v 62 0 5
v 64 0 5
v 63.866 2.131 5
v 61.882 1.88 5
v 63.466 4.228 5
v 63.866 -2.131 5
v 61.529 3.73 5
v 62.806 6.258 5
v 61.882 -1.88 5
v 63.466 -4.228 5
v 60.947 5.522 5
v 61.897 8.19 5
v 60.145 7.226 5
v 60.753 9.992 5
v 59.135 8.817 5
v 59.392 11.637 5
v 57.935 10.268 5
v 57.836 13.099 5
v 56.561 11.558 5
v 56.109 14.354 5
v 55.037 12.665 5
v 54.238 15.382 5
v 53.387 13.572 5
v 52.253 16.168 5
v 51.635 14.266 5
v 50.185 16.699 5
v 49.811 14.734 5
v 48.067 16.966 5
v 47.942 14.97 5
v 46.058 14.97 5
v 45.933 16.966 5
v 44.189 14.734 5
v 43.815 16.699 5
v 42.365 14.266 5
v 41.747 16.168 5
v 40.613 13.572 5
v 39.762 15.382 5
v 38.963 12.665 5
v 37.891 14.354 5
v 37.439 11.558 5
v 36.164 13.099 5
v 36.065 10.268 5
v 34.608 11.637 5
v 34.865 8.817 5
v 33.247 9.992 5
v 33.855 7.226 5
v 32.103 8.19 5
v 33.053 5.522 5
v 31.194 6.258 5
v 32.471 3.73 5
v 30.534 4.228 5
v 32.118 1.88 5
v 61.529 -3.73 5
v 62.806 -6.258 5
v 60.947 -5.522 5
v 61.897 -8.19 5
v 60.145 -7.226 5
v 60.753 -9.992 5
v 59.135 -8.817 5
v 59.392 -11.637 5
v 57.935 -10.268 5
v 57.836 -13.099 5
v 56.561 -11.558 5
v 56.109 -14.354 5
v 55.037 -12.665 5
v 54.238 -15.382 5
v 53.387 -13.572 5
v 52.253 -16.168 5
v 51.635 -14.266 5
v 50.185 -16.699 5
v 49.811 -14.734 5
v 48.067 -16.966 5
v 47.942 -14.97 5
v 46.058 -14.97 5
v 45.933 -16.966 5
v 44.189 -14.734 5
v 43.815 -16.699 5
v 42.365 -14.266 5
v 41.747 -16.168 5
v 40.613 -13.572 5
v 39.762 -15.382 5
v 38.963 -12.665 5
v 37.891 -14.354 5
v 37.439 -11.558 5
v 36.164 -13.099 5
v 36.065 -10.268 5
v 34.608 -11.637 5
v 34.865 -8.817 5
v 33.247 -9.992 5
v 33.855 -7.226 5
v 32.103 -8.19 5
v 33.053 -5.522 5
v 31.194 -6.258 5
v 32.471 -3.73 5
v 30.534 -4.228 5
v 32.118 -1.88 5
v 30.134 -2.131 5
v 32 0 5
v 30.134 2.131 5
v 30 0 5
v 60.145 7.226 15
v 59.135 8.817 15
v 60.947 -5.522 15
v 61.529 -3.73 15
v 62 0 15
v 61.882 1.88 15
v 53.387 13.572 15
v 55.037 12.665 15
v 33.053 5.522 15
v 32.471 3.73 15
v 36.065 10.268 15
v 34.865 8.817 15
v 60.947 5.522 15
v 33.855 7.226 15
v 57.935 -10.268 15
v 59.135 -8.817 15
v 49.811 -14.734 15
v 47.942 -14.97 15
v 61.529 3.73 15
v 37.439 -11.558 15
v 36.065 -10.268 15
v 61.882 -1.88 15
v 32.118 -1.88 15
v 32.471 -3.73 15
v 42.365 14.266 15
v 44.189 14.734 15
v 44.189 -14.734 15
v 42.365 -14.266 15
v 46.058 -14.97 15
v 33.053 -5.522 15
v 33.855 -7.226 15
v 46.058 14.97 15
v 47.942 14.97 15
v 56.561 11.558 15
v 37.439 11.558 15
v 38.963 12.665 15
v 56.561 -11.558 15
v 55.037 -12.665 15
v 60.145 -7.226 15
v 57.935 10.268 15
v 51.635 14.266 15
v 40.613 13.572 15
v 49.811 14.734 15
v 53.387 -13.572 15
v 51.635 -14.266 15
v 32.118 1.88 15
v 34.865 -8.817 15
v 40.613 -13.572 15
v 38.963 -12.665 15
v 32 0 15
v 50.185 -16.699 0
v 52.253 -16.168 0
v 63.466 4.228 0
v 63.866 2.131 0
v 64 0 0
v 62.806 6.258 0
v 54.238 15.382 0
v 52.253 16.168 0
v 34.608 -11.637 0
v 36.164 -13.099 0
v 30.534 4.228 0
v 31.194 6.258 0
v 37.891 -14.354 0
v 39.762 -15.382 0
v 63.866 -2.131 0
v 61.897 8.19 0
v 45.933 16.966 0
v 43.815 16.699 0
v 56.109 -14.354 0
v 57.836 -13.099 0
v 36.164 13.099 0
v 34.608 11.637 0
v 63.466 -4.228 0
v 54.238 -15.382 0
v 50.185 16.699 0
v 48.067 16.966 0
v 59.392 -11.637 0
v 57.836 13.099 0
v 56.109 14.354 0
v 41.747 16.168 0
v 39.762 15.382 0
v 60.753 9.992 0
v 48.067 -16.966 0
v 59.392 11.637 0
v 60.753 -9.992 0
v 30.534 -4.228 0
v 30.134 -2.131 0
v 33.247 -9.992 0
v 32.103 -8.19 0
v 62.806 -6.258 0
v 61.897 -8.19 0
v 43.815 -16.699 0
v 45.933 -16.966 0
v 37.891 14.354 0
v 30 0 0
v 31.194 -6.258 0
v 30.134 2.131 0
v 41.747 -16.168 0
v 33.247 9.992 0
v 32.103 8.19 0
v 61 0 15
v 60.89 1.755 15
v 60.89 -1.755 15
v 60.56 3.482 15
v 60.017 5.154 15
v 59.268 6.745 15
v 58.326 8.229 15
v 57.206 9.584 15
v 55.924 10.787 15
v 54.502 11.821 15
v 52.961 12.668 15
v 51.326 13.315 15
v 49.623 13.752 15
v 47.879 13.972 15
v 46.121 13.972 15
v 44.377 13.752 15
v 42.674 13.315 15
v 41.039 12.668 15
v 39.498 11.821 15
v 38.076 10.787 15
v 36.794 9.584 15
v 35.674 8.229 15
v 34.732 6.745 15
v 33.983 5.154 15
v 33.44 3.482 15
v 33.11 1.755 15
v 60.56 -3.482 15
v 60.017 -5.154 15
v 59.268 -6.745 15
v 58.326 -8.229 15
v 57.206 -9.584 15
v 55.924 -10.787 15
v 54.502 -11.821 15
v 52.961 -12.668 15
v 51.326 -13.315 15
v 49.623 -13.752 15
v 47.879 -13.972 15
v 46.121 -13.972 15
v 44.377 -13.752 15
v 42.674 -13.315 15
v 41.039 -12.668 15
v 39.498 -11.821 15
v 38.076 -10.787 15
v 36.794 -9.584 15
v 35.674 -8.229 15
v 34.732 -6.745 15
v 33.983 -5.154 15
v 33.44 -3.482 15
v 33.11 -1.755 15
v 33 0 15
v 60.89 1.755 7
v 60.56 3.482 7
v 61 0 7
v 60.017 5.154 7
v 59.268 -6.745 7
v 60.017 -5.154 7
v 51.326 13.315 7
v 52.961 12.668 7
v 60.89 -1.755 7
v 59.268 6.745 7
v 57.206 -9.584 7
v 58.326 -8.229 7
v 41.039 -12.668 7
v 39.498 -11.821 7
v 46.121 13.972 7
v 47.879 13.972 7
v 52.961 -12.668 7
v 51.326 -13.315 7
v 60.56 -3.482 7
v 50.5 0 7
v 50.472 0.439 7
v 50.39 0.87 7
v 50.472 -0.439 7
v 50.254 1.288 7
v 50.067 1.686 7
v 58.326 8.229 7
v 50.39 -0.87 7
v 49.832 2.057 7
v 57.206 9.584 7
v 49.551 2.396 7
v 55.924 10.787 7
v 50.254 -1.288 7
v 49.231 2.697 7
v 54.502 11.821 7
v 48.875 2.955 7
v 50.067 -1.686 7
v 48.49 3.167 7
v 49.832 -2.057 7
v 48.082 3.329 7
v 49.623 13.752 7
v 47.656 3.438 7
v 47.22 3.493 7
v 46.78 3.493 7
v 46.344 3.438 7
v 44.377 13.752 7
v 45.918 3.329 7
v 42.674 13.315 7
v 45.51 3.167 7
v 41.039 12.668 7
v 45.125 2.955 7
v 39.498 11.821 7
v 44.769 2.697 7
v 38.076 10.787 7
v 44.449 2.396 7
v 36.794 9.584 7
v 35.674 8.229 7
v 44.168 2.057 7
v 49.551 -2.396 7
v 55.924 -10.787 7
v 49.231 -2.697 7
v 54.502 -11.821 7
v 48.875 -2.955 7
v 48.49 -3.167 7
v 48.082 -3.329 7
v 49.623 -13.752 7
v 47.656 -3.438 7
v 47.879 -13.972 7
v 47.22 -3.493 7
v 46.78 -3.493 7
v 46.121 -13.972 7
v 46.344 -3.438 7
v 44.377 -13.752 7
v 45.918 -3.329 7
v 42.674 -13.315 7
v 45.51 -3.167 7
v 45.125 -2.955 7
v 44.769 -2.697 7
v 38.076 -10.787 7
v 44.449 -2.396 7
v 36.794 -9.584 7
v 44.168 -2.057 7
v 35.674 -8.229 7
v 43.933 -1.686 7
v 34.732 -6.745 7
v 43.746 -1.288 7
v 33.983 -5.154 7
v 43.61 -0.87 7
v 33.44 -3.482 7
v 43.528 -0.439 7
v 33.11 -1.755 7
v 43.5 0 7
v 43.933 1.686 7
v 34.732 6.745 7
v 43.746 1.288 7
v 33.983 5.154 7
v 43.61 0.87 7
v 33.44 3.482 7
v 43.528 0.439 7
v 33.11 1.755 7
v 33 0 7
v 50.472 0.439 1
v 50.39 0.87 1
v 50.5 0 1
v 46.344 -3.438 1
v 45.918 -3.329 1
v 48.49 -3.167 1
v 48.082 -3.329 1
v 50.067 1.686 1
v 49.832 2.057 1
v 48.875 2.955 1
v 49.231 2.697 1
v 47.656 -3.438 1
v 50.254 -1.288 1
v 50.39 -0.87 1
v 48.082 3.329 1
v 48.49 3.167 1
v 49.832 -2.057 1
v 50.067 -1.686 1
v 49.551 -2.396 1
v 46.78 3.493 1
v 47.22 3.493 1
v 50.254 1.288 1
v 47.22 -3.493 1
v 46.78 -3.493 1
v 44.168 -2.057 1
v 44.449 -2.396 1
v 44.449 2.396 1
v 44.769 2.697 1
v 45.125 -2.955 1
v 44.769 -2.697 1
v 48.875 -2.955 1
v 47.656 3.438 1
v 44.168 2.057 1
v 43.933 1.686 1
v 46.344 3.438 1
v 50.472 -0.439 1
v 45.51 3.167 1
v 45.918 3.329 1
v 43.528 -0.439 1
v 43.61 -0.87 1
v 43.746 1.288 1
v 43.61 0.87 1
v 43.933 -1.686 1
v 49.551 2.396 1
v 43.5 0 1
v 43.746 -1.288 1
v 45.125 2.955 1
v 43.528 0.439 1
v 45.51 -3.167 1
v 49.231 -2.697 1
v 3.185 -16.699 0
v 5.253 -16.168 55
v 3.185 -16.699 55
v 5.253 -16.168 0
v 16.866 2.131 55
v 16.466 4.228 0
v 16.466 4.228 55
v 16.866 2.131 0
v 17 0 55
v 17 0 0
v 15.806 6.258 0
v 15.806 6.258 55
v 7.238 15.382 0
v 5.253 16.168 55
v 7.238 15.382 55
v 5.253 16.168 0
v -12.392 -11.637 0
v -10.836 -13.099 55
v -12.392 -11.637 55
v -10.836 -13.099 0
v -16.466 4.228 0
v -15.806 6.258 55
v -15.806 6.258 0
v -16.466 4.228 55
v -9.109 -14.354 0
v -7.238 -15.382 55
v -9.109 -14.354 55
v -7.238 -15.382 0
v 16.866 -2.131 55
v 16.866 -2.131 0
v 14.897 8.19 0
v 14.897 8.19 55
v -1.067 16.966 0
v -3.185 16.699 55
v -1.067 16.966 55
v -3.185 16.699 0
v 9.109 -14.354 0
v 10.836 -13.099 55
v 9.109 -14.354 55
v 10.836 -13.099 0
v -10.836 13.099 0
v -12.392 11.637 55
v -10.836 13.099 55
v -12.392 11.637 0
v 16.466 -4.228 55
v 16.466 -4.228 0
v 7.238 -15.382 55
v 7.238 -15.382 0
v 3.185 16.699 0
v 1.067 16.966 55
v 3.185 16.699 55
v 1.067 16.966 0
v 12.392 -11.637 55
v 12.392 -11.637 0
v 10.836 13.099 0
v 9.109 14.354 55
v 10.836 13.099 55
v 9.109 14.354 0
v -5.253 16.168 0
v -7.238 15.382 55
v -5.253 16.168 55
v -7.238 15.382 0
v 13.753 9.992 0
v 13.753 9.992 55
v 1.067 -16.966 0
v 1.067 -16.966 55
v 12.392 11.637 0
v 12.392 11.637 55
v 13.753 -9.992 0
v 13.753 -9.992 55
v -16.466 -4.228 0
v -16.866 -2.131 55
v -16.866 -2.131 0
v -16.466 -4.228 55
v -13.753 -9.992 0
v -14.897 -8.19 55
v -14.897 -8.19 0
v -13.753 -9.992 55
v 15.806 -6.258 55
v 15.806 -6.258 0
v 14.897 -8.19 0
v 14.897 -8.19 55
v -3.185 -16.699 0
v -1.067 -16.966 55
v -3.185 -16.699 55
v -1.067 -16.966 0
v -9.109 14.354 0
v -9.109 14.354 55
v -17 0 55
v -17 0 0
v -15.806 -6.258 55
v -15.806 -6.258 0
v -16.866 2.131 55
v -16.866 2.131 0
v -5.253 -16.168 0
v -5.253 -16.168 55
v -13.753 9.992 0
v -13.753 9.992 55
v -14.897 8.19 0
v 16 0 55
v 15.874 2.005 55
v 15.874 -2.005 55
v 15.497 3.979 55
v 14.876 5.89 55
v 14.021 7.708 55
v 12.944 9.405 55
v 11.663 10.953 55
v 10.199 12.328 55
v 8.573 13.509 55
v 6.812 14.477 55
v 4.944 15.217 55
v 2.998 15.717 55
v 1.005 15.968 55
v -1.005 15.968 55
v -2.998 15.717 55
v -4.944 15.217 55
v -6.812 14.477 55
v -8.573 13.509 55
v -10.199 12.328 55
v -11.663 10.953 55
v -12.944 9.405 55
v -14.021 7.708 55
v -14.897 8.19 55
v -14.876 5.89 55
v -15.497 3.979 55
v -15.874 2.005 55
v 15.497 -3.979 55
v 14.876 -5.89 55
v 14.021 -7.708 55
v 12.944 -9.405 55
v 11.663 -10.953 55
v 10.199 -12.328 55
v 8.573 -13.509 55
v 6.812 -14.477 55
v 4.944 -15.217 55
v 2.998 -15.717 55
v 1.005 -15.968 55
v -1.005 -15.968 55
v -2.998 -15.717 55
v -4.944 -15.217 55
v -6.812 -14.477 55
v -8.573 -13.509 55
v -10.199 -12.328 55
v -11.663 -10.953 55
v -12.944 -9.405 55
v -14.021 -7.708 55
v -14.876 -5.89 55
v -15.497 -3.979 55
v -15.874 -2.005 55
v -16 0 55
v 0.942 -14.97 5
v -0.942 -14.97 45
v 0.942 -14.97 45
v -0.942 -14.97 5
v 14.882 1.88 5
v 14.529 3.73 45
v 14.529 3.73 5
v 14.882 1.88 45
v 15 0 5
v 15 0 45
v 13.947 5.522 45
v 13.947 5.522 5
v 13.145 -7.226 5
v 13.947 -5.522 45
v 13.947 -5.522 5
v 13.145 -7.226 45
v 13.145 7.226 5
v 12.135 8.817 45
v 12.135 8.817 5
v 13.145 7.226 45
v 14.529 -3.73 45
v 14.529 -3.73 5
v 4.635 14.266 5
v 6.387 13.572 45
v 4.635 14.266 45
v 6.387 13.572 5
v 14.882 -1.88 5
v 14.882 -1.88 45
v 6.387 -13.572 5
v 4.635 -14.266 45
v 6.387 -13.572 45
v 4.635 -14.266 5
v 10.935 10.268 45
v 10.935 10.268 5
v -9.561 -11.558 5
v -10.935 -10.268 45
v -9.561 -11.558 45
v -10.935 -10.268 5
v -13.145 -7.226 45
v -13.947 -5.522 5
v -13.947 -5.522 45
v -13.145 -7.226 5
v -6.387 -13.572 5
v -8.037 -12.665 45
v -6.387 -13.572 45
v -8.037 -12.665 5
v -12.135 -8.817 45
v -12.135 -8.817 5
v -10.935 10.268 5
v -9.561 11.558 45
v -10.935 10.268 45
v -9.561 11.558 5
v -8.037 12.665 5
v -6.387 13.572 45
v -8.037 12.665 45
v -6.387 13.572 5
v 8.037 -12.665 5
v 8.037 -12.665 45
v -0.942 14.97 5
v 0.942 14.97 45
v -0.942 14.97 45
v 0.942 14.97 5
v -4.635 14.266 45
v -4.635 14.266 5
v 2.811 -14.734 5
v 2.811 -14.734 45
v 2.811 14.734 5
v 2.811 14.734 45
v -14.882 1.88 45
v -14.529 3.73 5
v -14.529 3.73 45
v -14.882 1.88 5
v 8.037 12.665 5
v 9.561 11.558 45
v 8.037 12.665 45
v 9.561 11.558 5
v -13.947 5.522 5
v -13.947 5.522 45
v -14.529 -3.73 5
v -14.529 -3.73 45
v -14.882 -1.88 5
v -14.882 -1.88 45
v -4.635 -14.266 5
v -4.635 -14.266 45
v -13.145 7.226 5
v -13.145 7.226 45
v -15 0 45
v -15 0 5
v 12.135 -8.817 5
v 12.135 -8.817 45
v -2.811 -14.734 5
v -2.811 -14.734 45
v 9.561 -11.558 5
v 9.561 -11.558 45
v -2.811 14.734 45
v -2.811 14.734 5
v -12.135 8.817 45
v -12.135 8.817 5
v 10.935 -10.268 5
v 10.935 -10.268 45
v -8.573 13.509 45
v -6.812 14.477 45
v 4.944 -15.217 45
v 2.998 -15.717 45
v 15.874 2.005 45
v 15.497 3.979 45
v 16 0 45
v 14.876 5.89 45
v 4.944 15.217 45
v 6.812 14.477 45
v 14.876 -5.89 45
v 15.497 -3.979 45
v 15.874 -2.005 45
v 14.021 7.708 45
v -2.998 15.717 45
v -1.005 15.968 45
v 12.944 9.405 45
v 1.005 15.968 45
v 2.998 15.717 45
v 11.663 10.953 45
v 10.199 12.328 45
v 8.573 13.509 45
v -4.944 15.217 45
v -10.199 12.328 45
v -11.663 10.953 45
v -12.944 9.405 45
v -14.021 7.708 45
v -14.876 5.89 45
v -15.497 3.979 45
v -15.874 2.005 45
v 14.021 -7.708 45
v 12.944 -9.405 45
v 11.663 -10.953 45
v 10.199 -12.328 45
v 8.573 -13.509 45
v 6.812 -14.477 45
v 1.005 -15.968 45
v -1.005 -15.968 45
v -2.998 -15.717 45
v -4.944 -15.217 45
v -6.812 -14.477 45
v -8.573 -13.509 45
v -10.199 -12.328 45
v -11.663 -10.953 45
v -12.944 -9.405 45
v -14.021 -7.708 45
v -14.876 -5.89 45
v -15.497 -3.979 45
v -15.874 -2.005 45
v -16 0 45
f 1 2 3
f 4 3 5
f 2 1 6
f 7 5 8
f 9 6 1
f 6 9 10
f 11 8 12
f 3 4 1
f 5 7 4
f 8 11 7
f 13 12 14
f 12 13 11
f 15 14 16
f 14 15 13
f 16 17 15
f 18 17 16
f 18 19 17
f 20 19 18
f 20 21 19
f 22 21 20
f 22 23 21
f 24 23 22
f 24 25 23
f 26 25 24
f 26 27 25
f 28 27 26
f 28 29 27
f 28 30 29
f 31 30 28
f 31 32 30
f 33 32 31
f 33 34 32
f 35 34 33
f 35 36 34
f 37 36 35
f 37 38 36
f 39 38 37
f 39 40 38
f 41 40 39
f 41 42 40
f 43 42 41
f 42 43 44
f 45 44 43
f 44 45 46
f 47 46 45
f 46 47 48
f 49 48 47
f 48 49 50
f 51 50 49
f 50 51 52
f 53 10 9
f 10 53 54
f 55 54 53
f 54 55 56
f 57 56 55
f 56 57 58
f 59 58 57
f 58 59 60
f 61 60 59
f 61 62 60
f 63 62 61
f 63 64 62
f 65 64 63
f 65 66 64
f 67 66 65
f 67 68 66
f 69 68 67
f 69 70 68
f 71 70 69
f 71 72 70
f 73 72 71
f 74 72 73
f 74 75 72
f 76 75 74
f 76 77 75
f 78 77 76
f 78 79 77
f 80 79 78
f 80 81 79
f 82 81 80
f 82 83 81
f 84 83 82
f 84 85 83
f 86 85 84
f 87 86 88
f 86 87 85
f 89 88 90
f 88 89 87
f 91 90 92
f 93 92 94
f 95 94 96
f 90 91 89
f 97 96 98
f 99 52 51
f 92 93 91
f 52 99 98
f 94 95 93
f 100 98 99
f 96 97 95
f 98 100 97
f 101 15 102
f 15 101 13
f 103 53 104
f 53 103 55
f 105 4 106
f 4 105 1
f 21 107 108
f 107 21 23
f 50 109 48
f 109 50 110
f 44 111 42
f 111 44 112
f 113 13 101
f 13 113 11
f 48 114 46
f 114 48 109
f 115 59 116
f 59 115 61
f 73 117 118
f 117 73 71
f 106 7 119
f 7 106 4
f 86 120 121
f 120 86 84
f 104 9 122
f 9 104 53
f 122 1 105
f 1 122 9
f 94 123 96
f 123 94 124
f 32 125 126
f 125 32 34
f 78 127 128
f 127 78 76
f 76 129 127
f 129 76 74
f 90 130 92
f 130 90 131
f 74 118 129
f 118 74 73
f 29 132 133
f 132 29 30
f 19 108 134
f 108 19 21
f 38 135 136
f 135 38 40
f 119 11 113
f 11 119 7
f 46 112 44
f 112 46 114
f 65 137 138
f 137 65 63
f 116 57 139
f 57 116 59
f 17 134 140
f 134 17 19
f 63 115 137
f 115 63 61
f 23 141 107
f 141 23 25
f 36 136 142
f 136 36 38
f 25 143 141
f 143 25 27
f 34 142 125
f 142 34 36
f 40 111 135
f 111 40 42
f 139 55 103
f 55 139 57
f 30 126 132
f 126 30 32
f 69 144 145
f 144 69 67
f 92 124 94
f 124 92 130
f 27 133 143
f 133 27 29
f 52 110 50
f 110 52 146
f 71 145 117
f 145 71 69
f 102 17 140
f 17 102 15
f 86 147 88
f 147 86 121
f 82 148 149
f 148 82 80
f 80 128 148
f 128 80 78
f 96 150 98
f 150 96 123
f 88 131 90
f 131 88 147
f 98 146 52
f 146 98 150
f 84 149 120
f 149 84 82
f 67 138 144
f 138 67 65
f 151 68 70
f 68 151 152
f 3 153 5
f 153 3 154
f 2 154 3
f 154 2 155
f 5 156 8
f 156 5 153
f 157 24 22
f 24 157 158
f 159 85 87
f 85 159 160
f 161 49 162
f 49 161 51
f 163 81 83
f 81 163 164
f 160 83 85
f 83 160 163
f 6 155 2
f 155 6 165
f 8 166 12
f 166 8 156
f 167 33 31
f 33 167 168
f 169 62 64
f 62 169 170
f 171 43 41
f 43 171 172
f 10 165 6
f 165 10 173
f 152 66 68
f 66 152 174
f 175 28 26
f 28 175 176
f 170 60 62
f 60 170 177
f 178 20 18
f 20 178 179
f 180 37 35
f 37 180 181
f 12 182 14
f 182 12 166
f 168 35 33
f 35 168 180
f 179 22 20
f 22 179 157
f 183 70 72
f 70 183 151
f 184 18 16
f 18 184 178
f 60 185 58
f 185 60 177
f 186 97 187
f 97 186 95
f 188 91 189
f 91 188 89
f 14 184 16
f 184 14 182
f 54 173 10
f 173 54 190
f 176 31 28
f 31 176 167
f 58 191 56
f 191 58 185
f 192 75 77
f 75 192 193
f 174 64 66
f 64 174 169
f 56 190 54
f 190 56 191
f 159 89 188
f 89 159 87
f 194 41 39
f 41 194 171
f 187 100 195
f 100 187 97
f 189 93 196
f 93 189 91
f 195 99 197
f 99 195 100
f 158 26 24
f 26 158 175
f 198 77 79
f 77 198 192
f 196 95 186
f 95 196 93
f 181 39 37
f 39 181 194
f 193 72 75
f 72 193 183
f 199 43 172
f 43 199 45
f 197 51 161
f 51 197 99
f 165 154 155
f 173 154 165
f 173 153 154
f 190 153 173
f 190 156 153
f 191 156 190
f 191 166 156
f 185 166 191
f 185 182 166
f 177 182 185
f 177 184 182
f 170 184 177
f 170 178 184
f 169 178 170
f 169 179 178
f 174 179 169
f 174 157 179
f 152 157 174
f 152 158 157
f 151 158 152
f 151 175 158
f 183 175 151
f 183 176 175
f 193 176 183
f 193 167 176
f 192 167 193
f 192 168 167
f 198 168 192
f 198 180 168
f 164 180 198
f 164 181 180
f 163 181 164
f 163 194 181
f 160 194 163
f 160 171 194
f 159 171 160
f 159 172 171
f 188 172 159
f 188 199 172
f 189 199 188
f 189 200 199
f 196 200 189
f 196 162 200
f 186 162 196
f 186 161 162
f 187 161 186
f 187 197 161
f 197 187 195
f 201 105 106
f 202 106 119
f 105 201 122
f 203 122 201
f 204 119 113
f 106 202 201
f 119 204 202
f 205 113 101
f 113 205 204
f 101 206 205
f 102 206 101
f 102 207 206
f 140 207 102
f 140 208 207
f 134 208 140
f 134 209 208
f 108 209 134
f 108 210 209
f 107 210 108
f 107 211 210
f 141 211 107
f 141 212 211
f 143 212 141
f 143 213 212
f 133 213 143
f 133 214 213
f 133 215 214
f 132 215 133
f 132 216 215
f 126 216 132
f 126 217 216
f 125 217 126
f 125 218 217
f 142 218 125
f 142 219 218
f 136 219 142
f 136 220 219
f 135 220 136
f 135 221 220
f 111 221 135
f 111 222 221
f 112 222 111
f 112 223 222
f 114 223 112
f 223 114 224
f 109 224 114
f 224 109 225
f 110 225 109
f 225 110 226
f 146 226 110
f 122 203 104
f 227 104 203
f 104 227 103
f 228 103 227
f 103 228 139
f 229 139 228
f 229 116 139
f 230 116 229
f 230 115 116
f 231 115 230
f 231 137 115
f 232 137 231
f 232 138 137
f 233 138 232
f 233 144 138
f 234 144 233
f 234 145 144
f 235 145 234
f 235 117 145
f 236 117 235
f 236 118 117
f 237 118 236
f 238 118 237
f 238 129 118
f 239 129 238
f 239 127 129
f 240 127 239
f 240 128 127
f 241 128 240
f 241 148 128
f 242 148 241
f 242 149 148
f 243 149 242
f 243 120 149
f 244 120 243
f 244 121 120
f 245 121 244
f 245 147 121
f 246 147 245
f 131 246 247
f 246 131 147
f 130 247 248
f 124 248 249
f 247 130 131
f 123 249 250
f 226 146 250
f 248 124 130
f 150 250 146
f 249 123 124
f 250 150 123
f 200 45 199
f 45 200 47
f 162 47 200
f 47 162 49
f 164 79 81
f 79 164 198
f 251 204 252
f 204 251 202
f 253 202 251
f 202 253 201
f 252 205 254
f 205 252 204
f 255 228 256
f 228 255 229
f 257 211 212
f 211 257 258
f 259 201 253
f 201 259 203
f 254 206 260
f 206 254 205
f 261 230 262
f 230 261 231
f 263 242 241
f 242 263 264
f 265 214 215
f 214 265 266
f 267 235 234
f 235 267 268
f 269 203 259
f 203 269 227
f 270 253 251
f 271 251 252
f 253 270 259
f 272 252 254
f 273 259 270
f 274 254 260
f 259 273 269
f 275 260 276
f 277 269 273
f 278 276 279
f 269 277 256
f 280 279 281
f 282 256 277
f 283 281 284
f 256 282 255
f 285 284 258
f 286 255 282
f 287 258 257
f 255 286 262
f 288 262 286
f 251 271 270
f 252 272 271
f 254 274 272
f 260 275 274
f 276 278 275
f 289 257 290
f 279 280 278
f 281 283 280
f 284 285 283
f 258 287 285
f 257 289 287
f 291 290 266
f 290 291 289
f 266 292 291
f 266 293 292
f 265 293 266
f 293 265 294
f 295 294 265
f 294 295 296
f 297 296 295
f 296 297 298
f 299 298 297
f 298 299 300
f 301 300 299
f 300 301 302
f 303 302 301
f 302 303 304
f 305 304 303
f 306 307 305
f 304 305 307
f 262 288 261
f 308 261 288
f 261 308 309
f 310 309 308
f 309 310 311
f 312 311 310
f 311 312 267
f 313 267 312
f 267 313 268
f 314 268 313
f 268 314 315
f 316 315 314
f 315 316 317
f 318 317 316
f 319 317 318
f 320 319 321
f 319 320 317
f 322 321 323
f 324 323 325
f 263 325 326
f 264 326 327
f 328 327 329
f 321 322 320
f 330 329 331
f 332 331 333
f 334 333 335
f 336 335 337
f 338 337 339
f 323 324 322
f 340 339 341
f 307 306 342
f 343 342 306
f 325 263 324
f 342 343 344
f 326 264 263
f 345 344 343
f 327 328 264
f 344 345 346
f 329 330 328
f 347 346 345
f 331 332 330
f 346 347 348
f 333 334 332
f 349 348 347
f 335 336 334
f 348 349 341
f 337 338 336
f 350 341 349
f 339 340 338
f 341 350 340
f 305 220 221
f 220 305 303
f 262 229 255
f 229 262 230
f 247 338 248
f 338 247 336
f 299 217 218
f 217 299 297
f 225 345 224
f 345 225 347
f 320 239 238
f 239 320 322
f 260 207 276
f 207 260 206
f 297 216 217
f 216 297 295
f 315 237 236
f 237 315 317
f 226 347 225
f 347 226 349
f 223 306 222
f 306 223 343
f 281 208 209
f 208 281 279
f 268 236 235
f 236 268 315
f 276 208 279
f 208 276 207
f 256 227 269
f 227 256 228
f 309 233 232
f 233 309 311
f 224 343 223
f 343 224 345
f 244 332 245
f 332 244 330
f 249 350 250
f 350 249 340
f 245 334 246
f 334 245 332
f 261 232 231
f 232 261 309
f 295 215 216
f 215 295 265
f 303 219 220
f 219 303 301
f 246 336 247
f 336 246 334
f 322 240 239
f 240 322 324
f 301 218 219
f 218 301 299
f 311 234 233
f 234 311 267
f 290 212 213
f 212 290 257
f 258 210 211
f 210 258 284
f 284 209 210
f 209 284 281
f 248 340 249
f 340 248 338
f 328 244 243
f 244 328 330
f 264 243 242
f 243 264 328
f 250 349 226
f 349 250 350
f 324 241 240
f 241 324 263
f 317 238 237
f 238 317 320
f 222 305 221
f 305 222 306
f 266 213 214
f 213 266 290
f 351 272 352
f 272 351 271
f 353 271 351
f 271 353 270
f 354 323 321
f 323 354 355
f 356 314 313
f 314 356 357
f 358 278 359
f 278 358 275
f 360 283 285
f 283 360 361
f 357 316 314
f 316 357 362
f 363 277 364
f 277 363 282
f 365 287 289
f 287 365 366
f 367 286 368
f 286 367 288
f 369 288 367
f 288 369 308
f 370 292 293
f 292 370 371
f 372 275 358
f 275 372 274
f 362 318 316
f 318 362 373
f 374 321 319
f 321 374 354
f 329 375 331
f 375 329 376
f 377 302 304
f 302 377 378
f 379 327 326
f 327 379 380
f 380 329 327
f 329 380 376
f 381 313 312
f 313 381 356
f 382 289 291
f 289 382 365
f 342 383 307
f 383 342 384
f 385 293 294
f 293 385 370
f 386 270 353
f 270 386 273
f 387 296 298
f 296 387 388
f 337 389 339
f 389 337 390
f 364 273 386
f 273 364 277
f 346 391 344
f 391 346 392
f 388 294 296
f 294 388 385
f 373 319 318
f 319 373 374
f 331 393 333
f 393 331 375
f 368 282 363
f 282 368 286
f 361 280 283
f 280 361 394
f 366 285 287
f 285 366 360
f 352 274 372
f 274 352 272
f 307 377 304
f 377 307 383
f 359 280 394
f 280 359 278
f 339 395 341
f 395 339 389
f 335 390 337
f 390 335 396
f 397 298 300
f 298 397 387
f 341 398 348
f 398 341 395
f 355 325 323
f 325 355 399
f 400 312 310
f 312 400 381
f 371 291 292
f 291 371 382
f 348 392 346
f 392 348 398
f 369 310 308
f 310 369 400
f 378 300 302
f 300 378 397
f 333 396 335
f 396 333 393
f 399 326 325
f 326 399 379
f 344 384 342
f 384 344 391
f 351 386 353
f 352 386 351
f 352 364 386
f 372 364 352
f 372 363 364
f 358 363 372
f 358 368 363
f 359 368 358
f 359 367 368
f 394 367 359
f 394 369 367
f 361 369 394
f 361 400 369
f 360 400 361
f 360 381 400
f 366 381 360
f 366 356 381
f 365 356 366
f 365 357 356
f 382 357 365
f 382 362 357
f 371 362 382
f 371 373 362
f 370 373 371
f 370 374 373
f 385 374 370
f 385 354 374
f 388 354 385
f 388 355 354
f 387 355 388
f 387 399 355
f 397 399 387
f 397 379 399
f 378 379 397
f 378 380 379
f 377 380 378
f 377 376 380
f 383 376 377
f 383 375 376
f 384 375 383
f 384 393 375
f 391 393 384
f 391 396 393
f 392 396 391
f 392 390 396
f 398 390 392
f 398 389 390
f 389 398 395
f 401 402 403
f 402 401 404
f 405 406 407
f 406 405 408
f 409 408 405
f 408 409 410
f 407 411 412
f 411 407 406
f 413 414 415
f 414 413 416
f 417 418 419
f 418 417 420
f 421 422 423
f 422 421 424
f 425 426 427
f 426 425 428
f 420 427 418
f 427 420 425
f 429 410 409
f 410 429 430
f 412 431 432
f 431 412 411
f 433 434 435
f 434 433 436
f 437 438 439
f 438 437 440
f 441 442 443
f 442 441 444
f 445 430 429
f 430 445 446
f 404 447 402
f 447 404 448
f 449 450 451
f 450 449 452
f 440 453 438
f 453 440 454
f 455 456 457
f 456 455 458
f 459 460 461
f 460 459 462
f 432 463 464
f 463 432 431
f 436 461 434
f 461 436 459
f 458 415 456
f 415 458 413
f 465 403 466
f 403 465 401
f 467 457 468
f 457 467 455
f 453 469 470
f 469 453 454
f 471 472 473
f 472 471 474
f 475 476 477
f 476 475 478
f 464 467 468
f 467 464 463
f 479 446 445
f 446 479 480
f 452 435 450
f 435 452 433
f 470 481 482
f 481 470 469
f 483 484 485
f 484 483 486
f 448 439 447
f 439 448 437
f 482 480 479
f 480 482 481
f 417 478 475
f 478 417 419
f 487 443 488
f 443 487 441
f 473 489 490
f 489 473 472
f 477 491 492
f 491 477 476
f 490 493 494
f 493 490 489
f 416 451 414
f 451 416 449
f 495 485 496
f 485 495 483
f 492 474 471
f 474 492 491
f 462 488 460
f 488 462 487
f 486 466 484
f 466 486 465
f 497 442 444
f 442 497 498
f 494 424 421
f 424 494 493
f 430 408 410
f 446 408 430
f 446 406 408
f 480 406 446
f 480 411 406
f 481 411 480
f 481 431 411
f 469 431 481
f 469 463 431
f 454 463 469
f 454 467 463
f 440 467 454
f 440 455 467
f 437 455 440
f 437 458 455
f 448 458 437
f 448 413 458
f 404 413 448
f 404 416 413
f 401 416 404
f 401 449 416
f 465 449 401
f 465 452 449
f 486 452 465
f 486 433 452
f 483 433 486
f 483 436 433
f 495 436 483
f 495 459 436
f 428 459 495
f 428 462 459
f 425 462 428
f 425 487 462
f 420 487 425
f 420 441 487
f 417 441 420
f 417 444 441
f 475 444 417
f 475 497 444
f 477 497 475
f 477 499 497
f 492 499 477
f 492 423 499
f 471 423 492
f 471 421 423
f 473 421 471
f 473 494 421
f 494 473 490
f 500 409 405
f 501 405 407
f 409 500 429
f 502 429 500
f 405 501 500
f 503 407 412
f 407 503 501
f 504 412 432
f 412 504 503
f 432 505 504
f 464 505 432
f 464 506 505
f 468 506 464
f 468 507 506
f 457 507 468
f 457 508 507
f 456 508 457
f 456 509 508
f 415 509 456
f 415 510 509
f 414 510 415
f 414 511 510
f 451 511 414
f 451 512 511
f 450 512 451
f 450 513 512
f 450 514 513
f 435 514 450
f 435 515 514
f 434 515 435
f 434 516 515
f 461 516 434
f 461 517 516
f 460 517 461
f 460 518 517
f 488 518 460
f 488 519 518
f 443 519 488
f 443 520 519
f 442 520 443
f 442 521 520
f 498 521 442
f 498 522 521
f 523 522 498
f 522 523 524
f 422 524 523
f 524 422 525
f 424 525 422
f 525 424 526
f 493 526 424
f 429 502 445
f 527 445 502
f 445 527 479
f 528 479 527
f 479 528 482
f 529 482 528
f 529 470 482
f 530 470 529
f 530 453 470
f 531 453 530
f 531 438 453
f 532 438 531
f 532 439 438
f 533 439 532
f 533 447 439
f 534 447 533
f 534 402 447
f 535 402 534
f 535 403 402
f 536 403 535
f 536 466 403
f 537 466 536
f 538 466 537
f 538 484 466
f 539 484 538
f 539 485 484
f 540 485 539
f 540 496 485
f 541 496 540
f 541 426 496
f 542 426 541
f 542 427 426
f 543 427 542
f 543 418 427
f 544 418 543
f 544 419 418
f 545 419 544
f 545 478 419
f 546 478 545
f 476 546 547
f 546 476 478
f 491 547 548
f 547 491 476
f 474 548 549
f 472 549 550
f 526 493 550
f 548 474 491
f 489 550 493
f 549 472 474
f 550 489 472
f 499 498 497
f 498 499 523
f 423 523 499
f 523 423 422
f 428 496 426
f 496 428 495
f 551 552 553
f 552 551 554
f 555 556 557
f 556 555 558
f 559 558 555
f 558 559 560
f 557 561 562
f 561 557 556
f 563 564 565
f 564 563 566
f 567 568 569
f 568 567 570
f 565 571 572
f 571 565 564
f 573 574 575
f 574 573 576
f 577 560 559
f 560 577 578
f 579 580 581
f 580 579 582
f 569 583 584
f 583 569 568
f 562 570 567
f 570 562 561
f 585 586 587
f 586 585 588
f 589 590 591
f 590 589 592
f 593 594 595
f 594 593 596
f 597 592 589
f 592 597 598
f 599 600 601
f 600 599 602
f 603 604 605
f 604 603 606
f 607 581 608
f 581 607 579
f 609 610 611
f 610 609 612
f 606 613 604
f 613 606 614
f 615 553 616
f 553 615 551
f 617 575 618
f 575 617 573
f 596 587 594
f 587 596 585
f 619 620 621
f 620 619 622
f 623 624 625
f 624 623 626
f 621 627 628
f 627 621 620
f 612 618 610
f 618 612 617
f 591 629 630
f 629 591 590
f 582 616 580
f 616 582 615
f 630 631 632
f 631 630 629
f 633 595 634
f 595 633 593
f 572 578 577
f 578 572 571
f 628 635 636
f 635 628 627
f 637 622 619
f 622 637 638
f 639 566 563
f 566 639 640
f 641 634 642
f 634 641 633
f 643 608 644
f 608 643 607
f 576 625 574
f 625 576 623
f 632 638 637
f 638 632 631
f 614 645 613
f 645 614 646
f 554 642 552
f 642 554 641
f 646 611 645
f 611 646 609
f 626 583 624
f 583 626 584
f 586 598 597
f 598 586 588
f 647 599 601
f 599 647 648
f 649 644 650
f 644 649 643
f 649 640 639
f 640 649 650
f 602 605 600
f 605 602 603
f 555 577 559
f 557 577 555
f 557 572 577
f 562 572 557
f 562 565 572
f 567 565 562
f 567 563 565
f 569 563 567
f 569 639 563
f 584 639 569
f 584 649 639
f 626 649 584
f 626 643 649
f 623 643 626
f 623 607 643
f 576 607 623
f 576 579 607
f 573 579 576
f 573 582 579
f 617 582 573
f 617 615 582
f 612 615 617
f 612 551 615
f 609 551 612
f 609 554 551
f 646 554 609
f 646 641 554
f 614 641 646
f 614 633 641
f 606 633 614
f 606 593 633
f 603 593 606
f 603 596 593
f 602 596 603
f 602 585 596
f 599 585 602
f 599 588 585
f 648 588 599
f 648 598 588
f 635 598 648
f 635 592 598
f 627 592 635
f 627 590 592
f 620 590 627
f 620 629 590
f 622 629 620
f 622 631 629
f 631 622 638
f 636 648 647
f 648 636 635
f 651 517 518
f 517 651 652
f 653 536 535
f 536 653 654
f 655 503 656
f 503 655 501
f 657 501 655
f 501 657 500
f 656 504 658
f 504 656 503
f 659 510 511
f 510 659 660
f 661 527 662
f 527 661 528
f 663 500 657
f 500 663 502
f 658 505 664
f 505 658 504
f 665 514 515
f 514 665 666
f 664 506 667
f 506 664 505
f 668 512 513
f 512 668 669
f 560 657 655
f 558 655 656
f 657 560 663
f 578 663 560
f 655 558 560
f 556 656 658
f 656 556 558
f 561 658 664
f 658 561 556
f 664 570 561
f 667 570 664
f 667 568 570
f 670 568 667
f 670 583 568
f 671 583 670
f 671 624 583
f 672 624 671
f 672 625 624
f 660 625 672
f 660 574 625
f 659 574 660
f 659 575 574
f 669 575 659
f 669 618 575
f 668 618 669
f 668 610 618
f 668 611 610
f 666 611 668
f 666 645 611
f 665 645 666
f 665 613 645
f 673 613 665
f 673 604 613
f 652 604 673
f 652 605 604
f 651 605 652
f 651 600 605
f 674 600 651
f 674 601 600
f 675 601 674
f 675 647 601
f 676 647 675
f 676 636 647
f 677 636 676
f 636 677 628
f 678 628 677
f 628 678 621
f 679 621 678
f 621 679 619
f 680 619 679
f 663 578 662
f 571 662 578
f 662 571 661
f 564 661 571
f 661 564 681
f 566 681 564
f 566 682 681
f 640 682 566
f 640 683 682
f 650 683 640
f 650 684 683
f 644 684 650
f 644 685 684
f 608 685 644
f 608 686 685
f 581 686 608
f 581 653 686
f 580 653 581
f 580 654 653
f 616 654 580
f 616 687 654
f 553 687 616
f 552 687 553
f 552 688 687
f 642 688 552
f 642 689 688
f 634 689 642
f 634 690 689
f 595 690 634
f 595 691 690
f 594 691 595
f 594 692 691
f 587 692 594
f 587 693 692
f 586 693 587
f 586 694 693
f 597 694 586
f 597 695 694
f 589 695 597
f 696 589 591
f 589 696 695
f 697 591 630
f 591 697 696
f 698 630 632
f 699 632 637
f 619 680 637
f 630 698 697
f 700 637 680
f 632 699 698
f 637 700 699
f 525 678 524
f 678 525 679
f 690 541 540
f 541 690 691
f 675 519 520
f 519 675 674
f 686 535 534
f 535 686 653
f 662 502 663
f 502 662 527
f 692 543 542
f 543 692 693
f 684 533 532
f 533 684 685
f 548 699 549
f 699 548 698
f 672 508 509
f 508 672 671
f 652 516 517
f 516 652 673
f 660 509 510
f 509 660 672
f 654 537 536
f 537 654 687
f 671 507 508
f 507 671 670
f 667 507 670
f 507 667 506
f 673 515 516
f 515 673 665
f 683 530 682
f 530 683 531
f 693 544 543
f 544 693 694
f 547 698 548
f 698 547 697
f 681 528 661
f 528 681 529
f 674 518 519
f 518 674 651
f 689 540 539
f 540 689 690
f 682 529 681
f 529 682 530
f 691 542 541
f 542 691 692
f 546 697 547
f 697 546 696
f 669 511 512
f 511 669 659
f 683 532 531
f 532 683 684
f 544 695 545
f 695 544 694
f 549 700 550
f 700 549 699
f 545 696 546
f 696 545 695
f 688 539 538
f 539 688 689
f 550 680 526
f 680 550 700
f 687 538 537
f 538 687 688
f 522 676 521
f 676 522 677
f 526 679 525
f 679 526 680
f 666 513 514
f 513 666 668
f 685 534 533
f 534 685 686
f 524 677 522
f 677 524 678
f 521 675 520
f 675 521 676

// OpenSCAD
///////////////////////////////////////////////
// Title:  Parametric Atomizer Case
// Author: Gotsanity
// Date:   9/26/15
///////////////////////////////////////////////
//                Params                     //
///////////////////////////////////////////////

// Radius of the Atomizer
atomizerRadius = 10;

// Height of the Atomizer
atomizerHeight = 50;

// Don't Edit these
atomizerDiameter = atomizerRadius*2;
caseRadius = atomizerRadius+7;
caseHeight = atomizerHeight+10;
baseHeight = caseHeight/4;
topHeight = caseHeight-5;
$fn = 50;

///////////////////////////////////////////////
//                Renders                    //
///////////////////////////////////////////////
translate([caseRadius+30, 0, 0]){
    base();
}
top();

///////////////////////////////////////////////
//                Modules                    //
///////////////////////////////////////////////

module base() {
    difference(){
        cylinder(baseHeight, caseRadius, caseRadius);
        translate([0,0,7]){
            cylinder(baseHeight-2, caseRadius-3, caseRadius-3); 
        }
        translate([0,0,5]){
            difference(){
                cylinder(baseHeight-4, caseRadius+1, caseRadius+1);
                cylinder(baseHeight-4, caseRadius-2, caseRadius-2);
            }
        }
        translate ([0,0,1]){
            postHole();
        }
    }
}

module top() {
    difference(){
        cylinder(topHeight, caseRadius, caseRadius);
        translate([0,0,5]){
            cylinder(topHeight, caseRadius-2, caseRadius-2);
        }
        translate([0,0,topHeight+5-baseHeight]){
            cylinder(baseHeight-4, caseRadius-1, caseRadius-1);
        }
    }
}


module postHole() {
    cylinder(7,3.5,3.5);
}
